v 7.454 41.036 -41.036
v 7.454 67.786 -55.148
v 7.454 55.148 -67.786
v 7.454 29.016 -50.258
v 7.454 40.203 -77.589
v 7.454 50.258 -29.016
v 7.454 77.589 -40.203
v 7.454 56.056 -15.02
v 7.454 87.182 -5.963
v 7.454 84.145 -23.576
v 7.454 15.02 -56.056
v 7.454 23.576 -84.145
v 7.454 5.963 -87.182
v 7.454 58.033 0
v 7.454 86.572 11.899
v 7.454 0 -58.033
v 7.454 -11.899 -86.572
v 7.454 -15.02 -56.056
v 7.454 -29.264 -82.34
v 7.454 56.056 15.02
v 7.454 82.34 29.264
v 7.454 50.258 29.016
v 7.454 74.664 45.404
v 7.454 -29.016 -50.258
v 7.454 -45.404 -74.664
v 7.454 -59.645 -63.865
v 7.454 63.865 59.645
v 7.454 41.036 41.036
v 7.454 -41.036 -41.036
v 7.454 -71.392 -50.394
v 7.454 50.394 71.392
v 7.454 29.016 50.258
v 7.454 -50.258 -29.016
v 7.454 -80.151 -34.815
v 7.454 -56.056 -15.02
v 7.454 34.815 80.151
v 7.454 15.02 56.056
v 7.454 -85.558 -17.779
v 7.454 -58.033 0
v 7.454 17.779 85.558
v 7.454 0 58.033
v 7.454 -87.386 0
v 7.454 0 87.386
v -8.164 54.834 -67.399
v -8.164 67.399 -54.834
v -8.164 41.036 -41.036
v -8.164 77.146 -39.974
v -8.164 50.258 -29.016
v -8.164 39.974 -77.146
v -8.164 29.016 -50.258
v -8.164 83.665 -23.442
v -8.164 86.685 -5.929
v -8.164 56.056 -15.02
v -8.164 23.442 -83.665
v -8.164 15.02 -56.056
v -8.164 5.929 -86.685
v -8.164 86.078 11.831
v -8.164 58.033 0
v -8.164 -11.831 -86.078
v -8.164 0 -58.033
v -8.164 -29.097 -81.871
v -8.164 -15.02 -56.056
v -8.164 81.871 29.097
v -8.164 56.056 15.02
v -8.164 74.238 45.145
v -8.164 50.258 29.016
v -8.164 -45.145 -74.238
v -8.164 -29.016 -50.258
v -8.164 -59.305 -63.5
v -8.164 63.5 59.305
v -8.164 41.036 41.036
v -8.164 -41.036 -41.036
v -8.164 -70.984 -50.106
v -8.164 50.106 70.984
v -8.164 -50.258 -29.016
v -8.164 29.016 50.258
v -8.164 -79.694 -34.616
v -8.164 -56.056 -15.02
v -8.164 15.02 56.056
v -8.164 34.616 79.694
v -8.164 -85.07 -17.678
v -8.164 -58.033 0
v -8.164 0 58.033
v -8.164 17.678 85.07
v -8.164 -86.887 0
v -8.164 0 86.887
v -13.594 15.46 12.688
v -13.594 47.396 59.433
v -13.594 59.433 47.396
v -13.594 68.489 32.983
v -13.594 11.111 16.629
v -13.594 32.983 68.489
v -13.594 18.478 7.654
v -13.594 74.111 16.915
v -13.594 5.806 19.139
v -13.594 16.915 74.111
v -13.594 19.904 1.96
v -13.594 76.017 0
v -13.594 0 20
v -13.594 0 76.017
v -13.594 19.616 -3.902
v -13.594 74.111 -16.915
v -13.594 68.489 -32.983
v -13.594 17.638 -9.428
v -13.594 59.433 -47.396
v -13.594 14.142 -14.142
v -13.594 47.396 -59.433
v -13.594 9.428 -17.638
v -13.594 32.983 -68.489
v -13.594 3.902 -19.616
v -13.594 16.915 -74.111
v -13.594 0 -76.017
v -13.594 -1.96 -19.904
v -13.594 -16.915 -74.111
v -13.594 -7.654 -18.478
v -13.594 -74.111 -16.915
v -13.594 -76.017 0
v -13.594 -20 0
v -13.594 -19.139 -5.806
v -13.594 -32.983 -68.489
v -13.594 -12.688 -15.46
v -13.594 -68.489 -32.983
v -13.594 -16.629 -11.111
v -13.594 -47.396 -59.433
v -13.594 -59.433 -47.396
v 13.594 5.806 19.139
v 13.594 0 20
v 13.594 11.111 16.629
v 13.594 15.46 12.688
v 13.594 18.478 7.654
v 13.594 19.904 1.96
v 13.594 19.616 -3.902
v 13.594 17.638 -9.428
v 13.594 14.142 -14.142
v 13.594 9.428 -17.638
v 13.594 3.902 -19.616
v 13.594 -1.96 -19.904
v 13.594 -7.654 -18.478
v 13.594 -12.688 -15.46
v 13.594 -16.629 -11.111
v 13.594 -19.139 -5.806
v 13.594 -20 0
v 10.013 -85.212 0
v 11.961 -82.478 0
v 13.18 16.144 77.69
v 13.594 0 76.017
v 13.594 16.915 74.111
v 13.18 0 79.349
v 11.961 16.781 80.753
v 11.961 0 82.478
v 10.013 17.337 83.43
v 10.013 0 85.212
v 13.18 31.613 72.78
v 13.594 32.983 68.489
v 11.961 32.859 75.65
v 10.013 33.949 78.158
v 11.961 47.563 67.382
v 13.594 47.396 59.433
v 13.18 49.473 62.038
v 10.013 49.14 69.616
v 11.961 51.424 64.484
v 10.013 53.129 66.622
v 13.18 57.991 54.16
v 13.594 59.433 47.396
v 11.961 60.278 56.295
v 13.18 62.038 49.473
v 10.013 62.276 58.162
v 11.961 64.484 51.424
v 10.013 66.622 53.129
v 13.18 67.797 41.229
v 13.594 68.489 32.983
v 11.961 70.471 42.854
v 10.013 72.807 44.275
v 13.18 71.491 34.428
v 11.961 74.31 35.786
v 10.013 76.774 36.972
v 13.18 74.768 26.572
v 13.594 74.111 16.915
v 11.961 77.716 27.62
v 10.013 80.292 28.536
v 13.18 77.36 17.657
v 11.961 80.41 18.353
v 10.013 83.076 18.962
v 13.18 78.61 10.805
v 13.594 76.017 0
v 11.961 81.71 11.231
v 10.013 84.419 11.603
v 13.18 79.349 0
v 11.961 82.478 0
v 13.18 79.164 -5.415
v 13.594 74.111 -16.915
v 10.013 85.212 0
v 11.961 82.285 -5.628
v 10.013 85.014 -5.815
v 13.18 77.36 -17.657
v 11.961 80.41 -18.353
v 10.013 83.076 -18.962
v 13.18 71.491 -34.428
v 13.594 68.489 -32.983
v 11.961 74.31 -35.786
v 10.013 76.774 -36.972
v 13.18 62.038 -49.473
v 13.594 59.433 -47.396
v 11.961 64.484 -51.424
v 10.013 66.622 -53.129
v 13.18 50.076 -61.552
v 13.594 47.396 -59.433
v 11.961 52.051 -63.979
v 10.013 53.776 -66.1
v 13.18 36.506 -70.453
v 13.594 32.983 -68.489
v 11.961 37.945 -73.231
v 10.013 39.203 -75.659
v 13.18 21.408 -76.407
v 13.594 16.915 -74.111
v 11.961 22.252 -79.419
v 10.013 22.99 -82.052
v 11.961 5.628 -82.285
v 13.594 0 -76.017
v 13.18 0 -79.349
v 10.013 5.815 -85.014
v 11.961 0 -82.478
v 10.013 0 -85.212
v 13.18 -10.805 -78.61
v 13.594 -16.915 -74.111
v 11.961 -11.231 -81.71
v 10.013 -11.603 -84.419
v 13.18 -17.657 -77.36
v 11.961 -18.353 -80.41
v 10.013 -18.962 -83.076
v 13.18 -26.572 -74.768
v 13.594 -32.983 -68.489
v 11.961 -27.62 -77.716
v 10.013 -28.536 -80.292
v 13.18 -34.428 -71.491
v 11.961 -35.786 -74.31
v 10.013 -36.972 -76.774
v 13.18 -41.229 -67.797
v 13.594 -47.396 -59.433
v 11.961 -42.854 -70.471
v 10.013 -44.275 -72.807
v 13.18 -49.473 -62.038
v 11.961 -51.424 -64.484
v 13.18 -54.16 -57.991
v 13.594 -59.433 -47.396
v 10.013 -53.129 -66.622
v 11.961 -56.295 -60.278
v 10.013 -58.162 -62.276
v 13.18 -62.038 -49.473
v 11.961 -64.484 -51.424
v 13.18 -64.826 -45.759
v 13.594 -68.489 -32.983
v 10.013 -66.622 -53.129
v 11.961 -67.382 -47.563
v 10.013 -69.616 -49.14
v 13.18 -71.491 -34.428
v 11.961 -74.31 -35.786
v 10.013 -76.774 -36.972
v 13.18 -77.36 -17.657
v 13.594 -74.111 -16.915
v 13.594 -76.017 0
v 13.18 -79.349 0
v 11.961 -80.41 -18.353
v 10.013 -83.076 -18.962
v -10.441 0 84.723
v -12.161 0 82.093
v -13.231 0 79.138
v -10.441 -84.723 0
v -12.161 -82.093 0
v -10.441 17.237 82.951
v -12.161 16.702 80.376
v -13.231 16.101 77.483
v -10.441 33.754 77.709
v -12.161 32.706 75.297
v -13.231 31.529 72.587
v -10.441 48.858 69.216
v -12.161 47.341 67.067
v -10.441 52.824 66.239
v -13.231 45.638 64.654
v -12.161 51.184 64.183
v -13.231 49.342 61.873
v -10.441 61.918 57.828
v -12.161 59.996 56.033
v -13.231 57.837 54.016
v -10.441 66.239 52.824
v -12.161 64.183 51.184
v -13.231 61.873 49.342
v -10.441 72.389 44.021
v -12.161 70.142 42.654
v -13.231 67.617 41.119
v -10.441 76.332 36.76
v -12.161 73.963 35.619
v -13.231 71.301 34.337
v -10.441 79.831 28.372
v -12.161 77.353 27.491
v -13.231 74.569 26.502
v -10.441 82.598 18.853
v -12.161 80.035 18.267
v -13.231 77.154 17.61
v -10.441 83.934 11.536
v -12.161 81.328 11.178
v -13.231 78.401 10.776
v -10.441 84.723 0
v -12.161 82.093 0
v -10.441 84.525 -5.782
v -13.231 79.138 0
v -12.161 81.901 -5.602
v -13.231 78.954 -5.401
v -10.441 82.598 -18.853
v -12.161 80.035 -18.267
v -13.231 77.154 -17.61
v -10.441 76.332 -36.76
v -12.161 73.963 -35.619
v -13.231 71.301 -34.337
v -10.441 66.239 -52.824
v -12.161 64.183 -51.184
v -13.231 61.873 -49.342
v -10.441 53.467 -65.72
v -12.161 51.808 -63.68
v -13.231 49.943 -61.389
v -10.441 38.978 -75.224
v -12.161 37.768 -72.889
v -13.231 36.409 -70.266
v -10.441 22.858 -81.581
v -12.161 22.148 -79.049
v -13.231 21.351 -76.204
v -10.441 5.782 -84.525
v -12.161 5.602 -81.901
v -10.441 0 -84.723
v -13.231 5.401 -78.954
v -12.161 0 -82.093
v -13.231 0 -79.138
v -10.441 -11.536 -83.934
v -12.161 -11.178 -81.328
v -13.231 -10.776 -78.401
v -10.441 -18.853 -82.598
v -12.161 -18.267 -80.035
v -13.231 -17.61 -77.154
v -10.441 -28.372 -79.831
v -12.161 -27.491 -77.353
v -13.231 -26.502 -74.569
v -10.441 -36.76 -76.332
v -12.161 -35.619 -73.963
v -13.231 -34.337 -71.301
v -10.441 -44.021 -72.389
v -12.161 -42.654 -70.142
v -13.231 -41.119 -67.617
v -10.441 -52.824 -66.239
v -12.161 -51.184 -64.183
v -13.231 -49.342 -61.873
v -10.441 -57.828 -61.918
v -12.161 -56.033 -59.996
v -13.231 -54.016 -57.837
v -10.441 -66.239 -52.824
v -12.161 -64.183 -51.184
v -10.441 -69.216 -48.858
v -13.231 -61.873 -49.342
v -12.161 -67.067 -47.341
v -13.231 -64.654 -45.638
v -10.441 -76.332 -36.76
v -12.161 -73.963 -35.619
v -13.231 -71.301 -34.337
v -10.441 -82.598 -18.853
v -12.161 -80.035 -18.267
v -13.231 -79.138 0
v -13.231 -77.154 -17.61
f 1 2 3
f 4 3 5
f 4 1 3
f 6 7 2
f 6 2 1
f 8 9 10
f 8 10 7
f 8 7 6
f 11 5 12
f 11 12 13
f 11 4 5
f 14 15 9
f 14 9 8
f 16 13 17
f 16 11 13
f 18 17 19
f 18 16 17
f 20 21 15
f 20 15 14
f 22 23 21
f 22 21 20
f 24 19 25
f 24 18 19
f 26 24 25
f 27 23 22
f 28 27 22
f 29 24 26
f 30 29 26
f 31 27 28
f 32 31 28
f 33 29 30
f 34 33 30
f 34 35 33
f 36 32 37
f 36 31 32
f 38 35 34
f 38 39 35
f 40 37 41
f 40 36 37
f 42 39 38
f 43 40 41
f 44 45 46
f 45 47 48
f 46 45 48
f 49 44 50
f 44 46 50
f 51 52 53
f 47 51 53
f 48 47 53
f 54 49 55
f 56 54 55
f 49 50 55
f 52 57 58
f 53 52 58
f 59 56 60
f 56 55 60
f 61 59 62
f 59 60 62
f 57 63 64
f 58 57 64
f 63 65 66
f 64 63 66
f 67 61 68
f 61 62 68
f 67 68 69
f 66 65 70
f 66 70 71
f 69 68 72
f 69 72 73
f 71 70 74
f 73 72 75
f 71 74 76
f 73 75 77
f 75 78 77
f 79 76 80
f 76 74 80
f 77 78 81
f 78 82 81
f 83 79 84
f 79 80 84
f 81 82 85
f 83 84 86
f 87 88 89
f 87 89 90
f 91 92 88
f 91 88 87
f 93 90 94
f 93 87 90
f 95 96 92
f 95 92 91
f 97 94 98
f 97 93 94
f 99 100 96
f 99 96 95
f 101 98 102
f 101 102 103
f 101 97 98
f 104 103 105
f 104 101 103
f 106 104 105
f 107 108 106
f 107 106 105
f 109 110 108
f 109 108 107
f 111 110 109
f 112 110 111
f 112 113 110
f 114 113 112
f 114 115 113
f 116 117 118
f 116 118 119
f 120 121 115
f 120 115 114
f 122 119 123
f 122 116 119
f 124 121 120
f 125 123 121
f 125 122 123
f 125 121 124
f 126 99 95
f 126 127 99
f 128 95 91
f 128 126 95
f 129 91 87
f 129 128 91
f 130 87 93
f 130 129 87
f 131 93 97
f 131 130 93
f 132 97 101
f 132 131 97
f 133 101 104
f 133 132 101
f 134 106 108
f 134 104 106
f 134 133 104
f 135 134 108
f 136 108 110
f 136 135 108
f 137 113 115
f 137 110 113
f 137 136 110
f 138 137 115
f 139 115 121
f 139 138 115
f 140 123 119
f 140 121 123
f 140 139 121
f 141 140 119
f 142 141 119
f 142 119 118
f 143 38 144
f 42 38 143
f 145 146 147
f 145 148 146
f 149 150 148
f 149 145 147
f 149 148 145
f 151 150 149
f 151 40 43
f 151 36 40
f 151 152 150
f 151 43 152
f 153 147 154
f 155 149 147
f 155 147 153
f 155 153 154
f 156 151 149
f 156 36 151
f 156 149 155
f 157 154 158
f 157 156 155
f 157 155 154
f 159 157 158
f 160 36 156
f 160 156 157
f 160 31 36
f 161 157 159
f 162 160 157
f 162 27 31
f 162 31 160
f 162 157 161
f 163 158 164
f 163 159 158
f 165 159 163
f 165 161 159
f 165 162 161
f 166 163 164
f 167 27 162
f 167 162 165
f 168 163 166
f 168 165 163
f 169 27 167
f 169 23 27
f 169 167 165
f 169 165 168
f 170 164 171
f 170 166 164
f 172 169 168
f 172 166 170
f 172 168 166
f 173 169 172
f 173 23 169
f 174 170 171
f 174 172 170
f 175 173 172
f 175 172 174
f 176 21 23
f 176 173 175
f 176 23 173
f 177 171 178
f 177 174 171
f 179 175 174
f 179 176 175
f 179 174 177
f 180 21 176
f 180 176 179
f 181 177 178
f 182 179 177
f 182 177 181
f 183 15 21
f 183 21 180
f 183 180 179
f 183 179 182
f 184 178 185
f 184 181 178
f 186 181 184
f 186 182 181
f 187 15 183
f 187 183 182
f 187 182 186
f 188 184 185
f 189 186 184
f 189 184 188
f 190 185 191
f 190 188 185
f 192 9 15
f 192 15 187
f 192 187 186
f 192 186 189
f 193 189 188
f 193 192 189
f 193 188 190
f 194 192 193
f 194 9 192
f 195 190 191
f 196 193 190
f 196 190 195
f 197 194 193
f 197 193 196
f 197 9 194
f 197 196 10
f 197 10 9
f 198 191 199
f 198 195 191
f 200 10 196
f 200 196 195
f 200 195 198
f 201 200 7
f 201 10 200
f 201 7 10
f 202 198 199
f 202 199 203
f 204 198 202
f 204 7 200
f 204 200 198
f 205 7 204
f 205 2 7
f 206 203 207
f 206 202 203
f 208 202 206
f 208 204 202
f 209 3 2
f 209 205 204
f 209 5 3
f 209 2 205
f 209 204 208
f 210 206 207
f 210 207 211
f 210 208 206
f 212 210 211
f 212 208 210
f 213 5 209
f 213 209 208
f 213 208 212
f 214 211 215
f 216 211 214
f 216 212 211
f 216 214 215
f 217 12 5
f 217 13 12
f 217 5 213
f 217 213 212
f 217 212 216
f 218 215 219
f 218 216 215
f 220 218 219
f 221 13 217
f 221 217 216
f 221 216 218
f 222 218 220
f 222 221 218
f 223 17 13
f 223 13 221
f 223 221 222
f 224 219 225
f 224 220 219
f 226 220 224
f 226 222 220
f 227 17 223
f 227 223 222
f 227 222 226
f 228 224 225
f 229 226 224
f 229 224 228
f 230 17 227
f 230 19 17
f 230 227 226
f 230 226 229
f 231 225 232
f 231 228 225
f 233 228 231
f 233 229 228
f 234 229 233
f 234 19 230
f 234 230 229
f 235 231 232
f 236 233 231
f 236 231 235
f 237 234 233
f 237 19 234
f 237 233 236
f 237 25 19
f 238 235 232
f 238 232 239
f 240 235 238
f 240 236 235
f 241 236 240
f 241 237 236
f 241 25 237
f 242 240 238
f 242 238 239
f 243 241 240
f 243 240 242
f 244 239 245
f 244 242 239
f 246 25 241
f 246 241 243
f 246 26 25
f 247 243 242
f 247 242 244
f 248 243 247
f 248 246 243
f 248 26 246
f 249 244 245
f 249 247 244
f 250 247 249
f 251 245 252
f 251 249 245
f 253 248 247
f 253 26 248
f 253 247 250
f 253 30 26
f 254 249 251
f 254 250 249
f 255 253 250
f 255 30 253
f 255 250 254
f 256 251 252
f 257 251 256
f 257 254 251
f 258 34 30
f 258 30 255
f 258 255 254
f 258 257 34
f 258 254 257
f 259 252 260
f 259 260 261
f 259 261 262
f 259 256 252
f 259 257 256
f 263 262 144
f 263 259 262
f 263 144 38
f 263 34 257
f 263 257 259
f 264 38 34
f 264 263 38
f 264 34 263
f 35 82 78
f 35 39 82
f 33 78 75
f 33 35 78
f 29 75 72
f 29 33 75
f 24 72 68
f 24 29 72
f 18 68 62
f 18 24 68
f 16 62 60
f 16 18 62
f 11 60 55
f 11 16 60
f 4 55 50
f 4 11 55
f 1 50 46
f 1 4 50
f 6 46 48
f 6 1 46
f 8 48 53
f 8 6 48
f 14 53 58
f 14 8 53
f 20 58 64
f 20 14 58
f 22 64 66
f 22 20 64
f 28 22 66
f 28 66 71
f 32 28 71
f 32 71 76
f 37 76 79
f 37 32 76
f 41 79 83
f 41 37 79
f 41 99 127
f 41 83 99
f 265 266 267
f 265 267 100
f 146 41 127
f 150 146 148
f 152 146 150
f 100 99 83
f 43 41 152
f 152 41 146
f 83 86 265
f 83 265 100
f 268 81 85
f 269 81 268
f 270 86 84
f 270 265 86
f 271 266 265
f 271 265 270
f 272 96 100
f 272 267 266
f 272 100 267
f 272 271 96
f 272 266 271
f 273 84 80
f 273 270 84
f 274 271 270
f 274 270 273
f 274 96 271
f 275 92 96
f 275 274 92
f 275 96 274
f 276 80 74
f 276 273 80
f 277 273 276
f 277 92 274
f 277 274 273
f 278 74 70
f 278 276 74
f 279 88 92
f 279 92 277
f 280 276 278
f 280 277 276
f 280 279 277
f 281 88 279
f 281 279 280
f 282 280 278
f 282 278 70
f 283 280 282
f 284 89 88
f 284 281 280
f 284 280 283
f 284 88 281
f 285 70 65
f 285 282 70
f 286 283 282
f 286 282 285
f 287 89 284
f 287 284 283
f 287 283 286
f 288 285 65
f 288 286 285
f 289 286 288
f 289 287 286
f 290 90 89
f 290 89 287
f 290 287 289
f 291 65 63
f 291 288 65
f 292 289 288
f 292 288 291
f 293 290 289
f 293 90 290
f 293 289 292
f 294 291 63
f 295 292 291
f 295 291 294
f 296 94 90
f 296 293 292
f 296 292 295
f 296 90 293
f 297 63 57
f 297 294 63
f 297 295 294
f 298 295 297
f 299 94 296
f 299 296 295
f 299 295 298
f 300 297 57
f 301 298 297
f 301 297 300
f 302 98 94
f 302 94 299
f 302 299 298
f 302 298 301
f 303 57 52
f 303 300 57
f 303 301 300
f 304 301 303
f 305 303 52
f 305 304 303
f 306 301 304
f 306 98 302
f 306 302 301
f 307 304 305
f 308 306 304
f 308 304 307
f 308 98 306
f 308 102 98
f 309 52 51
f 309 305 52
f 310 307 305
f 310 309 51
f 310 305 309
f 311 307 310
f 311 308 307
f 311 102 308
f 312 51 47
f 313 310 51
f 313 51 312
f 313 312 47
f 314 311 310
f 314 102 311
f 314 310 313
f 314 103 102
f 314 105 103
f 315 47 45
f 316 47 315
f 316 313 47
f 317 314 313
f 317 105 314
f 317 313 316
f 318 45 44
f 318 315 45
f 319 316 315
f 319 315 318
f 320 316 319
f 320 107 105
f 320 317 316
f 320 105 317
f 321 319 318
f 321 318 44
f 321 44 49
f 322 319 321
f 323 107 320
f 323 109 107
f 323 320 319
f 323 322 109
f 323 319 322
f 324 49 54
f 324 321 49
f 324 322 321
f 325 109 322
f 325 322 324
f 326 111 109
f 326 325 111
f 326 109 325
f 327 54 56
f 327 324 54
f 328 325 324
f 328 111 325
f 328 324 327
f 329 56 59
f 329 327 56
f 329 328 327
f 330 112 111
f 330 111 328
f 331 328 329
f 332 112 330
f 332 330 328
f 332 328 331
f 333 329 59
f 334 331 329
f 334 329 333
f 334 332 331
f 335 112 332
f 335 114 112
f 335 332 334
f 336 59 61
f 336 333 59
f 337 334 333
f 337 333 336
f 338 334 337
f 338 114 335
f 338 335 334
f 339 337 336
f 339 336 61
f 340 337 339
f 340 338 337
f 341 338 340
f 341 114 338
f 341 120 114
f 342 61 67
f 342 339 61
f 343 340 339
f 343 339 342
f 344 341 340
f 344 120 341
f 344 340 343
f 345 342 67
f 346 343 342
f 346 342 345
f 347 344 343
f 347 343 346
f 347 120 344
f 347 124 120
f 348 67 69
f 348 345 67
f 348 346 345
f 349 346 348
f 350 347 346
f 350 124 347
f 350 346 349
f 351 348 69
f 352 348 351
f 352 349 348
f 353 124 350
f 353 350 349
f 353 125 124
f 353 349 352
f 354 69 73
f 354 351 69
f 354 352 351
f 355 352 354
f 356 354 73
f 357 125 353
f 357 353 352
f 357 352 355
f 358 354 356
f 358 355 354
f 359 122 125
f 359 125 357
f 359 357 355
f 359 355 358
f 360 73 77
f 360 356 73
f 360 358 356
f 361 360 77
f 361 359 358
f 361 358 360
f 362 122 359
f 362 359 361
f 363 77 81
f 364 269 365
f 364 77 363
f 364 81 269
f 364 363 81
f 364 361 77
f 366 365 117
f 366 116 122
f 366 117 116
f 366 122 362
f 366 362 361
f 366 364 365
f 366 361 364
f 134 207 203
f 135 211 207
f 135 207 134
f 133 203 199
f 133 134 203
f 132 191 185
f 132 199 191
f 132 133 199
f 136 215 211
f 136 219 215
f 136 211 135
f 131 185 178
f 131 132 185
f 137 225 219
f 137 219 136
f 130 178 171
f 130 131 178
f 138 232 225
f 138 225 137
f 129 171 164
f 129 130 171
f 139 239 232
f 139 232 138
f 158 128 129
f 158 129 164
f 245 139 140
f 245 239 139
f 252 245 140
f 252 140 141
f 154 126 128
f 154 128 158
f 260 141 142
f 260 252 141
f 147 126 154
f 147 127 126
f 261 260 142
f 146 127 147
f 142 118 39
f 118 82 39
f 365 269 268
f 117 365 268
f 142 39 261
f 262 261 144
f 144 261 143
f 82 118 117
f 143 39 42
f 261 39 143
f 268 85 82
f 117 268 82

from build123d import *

# Parameters (mm, degrees)
REVOLVE1_ANGLE           = 180
REVOLVE1_OTHER_WAY_ANGLE = 90
SKETCH7_W                = 15.617438642
SKETCH7_H                = 46.497374137


with BuildPart() as part:
    # Sketch1 → Revolve1 (revolve)
    with BuildSketch(Plane(origin=(0, 0, 0), x_dir=(1, 0, 0), z_dir=(0, 1, 0))):
        with BuildLine():
            Line((-13.594162094, 76.01737396), (-13.594162094, 20))
            Line((-13.594162094, 20), (13.594162094, 20))
            Line((13.594162094, 20), (13.594162094, 76.01737396))
            ThreePointArc((13.594162094, 76.01737396), (0, 89.611536054), (-13.594162094, 76.01737396))
        make_face()
    revolve(axis=Axis((-161.278786223, 0, 0), (1, 0, 0)), revolution_arc=REVOLVE1_ANGLE)

    # Sketch1 → Revolve1 other way (revolve)
    with BuildSketch(Plane(origin=(0, 0, 0), x_dir=(1, 0, 0), z_dir=(0, 1, 0))):
        with BuildLine():
            Line((-13.594162094, 76.01737396), (-13.594162094, 20))
            Line((-13.594162094, 20), (13.594162094, 20))
            Line((13.594162094, 20), (13.594162094, 76.01737396))
            ThreePointArc((13.594162094, 76.01737396), (0, 89.611536054), (-13.594162094, 76.01737396))
        make_face()
    revolve(axis=Axis((-161.278786223, 0, 0), (-1, 0, 0)), revolution_arc=REVOLVE1_OTHER_WAY_ANGLE)

    # Sketch7 → Cut-Revolve1 (revolve, cut)
    with BuildSketch(Plane.XY):
        with Locations((-0.354941787, 81.281669295)):
            Rectangle(SKETCH7_W, SKETCH7_H)
    revolve(axis=Axis((-109.322070492, 0, 0), (1, 0, 0)), mode=Mode.SUBTRACT)


solid = part.part
